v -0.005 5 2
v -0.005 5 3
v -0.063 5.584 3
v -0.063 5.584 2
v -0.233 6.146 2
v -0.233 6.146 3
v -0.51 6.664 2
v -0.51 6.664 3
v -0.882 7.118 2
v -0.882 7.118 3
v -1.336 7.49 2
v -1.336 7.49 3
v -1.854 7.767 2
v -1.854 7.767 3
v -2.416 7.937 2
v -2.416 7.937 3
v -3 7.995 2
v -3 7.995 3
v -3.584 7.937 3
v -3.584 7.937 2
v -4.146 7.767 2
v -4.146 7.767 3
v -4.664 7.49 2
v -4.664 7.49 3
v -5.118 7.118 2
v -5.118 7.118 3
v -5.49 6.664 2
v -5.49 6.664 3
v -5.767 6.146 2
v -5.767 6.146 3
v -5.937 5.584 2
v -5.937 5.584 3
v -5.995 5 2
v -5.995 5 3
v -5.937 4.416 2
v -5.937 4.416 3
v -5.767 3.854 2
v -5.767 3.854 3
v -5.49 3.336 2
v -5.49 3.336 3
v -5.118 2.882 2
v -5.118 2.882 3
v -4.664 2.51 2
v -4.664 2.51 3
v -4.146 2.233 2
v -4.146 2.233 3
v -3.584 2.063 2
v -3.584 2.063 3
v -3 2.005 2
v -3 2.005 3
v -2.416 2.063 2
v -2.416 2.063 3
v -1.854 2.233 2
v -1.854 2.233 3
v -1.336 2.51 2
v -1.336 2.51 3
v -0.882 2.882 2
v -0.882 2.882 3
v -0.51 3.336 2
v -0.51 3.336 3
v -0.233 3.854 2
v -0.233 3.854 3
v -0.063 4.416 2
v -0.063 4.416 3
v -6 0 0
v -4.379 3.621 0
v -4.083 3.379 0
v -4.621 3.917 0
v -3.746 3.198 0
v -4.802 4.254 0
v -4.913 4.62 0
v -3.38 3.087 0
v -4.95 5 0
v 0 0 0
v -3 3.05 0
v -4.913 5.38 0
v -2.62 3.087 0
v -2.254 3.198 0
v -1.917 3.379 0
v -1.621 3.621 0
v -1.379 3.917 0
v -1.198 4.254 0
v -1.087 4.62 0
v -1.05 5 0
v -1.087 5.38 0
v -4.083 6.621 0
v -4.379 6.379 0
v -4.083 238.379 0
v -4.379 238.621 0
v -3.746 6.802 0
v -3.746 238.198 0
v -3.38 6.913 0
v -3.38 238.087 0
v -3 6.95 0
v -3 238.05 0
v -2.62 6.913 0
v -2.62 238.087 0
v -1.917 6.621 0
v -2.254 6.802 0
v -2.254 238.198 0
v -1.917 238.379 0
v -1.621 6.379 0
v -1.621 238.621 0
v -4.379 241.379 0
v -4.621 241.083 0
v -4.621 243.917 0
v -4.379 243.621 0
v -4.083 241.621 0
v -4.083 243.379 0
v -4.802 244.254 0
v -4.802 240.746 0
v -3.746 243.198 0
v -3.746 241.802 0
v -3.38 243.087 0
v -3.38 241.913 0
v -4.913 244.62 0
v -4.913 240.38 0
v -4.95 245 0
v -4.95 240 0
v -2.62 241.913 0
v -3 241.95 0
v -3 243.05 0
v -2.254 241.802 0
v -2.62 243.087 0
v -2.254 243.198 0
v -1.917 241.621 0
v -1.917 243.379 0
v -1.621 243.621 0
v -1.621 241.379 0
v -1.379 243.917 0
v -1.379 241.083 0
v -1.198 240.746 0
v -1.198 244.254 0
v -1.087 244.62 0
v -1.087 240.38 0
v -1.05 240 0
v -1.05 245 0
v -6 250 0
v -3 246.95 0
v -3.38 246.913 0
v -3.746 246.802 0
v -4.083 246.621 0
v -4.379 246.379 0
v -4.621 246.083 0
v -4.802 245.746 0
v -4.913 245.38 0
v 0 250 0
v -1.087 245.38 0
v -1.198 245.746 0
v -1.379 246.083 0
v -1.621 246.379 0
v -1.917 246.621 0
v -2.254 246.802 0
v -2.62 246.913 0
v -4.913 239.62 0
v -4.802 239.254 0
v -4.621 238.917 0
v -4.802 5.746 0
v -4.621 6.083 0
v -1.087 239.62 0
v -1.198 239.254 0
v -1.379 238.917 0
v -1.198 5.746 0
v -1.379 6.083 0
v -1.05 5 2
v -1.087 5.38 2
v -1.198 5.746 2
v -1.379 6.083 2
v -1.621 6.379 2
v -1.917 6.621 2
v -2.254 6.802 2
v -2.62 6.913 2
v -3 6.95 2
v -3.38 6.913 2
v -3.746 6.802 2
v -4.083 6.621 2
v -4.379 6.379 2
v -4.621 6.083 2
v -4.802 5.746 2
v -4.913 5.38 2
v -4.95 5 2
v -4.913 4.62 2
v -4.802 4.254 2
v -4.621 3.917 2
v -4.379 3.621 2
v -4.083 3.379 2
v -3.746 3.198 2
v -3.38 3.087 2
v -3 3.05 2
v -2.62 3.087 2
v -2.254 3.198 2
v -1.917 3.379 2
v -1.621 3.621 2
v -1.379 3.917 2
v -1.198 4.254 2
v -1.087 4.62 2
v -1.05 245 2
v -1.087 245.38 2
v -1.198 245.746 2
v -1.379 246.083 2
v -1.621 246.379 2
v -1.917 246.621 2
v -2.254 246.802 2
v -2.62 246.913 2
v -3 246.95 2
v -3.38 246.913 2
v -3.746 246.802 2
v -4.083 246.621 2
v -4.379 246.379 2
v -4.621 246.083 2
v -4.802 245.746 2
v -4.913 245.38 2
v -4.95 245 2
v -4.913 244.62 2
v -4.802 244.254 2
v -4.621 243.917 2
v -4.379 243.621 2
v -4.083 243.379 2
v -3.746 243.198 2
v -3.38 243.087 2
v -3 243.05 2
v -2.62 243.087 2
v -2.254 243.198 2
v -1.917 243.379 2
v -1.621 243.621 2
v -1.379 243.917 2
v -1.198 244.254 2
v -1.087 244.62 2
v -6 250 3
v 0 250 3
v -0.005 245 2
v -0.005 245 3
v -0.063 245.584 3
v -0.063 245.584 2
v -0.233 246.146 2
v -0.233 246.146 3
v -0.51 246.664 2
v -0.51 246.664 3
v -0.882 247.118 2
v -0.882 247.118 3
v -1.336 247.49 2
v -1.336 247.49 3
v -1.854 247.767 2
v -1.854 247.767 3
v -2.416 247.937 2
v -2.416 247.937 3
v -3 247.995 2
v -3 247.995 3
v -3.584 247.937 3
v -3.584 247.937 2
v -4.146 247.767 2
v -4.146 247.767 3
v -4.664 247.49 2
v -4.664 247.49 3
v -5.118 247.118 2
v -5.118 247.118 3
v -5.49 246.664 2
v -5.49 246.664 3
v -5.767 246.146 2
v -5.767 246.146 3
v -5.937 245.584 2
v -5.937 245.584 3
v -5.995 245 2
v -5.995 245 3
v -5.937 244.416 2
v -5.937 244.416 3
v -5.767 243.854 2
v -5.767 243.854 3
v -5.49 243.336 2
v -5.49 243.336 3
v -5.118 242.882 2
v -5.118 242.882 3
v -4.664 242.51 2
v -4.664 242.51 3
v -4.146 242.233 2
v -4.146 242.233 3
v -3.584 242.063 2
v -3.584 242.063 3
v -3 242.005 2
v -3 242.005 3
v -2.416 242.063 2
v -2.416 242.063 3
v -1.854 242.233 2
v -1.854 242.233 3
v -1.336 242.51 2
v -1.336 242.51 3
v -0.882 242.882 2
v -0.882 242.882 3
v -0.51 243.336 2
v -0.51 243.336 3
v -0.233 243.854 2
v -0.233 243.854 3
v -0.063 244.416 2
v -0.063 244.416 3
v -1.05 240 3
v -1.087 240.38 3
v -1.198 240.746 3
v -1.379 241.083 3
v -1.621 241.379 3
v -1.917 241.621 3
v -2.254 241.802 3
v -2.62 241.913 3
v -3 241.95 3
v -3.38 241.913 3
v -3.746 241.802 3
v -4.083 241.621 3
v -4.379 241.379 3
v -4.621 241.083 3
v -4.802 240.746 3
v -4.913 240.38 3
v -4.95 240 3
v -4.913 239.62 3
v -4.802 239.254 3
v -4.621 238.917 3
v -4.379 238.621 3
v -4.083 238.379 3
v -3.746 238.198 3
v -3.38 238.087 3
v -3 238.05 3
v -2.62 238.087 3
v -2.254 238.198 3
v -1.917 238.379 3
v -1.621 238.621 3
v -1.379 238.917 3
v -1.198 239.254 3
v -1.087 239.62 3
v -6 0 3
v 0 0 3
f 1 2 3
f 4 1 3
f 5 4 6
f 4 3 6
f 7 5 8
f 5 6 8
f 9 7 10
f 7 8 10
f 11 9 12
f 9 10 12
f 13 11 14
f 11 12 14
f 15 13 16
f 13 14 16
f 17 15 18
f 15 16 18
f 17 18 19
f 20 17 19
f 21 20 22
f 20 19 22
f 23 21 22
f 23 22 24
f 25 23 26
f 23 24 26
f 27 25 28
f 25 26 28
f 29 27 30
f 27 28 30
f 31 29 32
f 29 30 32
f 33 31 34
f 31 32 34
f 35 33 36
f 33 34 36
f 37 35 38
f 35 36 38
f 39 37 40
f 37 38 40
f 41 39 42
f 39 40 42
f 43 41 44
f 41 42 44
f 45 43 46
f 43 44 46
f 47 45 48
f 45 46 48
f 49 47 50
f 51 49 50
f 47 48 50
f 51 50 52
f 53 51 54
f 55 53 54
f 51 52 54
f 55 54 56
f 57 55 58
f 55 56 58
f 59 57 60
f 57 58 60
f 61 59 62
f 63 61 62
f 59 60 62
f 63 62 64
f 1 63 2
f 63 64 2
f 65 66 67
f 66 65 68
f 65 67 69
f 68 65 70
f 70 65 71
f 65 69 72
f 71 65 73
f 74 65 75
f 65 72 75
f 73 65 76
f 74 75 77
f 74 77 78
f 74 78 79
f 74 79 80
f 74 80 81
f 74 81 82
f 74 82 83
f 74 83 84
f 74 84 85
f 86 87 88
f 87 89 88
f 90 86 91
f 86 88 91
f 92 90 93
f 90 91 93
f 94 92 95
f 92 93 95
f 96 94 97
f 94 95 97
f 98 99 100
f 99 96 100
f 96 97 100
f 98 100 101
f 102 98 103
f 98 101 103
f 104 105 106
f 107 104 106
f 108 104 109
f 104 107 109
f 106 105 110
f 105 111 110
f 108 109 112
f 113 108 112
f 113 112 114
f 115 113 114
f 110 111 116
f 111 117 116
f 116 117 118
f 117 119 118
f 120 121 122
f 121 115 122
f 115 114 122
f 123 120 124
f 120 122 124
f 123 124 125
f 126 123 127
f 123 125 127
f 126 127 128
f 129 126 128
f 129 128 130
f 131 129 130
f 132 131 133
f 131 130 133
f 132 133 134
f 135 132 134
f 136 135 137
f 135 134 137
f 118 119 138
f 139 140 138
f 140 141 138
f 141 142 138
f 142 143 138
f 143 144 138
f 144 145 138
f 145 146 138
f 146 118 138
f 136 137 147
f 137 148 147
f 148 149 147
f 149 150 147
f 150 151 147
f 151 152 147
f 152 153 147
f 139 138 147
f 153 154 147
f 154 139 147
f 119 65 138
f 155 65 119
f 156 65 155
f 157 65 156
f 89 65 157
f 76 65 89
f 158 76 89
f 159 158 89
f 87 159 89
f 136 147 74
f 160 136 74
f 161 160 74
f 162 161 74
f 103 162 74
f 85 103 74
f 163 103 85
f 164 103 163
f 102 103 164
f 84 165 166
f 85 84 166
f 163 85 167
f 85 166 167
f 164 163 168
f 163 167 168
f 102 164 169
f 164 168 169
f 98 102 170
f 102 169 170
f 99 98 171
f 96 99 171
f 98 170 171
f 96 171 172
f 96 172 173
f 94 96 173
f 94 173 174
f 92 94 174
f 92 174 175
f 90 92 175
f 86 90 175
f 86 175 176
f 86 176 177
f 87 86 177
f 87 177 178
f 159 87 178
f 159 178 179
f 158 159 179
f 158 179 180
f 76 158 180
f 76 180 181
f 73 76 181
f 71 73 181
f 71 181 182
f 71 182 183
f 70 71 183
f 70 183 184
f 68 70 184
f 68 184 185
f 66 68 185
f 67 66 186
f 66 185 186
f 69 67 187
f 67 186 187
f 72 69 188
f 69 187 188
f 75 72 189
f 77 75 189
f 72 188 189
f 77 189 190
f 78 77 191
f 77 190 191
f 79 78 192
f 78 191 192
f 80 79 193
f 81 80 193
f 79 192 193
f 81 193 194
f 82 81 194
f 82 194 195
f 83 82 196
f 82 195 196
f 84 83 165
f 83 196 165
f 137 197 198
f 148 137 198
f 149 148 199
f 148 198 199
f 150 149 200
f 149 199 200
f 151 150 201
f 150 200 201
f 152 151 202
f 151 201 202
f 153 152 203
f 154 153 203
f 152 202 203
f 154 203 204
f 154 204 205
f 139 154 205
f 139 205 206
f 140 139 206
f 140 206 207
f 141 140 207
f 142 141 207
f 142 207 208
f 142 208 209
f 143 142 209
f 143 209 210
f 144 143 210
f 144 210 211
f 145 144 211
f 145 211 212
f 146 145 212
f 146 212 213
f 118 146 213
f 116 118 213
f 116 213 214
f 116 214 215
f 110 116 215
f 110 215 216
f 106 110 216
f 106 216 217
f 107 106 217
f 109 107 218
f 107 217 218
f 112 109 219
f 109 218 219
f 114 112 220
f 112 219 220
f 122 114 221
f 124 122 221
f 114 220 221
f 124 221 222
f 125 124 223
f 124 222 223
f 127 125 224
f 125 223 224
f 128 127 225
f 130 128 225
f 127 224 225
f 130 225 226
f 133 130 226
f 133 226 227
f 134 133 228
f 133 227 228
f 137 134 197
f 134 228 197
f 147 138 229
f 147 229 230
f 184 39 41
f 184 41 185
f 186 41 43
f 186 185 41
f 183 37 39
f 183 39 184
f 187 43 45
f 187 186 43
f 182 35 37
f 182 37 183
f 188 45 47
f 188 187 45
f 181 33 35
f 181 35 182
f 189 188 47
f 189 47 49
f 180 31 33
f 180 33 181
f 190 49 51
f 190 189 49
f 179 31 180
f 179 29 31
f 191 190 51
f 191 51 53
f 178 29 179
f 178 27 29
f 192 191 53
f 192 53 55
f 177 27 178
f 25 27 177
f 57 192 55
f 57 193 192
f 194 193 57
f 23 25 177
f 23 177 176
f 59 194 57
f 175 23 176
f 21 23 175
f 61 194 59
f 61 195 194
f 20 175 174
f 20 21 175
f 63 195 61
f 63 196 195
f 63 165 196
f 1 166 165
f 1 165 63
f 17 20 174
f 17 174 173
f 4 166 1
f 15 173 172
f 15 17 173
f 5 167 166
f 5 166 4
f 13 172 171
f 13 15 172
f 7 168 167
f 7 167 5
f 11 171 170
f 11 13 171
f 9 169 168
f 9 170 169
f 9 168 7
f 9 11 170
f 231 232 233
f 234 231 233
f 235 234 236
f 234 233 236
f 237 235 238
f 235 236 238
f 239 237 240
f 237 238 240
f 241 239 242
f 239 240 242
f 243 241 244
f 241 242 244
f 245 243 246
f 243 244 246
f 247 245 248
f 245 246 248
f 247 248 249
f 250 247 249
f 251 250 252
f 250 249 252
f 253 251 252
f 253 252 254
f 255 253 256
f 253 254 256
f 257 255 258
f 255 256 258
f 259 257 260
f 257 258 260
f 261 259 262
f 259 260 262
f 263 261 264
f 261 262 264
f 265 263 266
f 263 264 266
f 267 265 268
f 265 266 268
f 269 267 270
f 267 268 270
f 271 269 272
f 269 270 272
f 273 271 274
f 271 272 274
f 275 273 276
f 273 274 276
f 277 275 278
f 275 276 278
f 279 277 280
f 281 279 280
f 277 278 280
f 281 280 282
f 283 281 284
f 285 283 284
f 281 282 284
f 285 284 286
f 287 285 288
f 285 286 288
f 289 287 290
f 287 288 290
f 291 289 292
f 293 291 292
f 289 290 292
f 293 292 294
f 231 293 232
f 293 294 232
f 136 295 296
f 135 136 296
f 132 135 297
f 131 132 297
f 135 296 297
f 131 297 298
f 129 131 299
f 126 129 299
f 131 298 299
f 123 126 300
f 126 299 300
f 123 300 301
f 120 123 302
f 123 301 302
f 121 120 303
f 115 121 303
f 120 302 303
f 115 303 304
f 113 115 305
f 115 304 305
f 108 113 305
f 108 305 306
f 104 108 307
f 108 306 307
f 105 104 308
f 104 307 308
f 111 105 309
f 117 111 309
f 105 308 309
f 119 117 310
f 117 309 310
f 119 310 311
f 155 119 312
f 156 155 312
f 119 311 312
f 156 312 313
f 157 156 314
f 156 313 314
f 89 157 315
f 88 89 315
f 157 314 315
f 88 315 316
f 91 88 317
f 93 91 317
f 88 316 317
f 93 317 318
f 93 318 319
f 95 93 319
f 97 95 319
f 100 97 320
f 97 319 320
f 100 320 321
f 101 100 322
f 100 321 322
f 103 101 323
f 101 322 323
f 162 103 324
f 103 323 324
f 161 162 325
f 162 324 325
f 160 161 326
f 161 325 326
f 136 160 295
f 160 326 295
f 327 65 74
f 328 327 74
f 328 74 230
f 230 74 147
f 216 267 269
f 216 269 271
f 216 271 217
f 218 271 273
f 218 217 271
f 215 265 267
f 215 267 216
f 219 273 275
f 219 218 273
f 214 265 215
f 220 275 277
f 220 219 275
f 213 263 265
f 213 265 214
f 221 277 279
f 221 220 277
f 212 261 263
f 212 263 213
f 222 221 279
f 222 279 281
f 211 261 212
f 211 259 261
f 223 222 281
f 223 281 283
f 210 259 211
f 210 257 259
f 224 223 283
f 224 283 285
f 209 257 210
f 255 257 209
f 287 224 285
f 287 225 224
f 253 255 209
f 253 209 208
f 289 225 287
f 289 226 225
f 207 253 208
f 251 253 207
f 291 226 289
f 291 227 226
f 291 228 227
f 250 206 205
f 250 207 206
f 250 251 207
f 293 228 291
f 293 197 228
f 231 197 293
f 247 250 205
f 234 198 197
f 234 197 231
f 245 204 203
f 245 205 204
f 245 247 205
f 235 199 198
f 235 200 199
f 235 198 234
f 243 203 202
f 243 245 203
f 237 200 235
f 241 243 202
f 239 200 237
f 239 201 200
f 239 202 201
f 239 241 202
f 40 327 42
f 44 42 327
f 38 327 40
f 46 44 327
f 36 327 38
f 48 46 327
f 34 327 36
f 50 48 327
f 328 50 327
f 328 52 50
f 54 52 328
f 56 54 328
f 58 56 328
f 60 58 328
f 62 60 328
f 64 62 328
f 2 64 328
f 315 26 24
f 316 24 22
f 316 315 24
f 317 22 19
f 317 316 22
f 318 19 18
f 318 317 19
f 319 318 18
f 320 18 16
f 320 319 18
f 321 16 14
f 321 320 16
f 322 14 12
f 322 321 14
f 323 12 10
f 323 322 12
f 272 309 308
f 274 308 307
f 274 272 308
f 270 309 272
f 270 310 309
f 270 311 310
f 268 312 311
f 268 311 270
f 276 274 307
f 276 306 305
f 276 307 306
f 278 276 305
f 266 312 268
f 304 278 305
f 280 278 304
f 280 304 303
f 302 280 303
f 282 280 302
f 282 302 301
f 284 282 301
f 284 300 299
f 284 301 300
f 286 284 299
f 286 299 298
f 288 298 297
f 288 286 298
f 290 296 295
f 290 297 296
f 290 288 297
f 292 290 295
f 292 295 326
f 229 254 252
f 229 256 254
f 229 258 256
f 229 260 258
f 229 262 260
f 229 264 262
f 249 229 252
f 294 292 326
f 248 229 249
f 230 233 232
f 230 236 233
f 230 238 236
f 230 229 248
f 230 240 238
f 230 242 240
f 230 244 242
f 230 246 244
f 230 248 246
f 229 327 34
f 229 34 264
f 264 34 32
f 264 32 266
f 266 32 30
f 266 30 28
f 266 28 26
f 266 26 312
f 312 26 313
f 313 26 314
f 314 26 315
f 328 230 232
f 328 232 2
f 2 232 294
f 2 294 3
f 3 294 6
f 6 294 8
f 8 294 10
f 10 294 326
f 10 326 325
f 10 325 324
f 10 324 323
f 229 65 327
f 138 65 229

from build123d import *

# Parameters (mm, degrees)
ESQUISSE1_W             = 6
ESQUISSE1_H             = 250
BOSS_EXTRU_1_DEPTH      = 3
ESQUISSE2_R             = 1.95
ENL_V_MAT_EXTRU_1_DEPTH = 3
ESQUISSE3_R             = 2.995
ENL_V_MAT_EXTRU_3_DEPTH = 1


with BuildPart() as part:
    # Esquisse1 → Boss.-Extru.1 (new body)
    with BuildSketch(Plane.XY):
        with Locations((-3, 125)):
            Rectangle(ESQUISSE1_W, ESQUISSE1_H)
    extrude(amount=BOSS_EXTRU_1_DEPTH)

    # Esquisse2 → Enlèv. mat.-Extru.1 (cut)
    with BuildSketch(Plane.XY.offset(3)):
        with Locations((-3, 245)):
            Circle(ESQUISSE2_R)
        with Locations((-3, 240)):
            Circle(ESQUISSE2_R)
        with Locations((-3, 5)):
            Circle(ESQUISSE2_R)
    extrude(amount=-ENL_V_MAT_EXTRU_1_DEPTH, mode=Mode.SUBTRACT)

    # Esquisse3 → Enlèv. mat.-Extru.3 (cut)
    with BuildSketch(Plane.XY.offset(3)):
        with Locations((-3, 5)):
            Circle(ESQUISSE3_R)
        with Locations((-3, 245)):
            Circle(ESQUISSE3_R)
    extrude(amount=-ENL_V_MAT_EXTRU_3_DEPTH, mode=Mode.SUBTRACT)


solid = part.part
